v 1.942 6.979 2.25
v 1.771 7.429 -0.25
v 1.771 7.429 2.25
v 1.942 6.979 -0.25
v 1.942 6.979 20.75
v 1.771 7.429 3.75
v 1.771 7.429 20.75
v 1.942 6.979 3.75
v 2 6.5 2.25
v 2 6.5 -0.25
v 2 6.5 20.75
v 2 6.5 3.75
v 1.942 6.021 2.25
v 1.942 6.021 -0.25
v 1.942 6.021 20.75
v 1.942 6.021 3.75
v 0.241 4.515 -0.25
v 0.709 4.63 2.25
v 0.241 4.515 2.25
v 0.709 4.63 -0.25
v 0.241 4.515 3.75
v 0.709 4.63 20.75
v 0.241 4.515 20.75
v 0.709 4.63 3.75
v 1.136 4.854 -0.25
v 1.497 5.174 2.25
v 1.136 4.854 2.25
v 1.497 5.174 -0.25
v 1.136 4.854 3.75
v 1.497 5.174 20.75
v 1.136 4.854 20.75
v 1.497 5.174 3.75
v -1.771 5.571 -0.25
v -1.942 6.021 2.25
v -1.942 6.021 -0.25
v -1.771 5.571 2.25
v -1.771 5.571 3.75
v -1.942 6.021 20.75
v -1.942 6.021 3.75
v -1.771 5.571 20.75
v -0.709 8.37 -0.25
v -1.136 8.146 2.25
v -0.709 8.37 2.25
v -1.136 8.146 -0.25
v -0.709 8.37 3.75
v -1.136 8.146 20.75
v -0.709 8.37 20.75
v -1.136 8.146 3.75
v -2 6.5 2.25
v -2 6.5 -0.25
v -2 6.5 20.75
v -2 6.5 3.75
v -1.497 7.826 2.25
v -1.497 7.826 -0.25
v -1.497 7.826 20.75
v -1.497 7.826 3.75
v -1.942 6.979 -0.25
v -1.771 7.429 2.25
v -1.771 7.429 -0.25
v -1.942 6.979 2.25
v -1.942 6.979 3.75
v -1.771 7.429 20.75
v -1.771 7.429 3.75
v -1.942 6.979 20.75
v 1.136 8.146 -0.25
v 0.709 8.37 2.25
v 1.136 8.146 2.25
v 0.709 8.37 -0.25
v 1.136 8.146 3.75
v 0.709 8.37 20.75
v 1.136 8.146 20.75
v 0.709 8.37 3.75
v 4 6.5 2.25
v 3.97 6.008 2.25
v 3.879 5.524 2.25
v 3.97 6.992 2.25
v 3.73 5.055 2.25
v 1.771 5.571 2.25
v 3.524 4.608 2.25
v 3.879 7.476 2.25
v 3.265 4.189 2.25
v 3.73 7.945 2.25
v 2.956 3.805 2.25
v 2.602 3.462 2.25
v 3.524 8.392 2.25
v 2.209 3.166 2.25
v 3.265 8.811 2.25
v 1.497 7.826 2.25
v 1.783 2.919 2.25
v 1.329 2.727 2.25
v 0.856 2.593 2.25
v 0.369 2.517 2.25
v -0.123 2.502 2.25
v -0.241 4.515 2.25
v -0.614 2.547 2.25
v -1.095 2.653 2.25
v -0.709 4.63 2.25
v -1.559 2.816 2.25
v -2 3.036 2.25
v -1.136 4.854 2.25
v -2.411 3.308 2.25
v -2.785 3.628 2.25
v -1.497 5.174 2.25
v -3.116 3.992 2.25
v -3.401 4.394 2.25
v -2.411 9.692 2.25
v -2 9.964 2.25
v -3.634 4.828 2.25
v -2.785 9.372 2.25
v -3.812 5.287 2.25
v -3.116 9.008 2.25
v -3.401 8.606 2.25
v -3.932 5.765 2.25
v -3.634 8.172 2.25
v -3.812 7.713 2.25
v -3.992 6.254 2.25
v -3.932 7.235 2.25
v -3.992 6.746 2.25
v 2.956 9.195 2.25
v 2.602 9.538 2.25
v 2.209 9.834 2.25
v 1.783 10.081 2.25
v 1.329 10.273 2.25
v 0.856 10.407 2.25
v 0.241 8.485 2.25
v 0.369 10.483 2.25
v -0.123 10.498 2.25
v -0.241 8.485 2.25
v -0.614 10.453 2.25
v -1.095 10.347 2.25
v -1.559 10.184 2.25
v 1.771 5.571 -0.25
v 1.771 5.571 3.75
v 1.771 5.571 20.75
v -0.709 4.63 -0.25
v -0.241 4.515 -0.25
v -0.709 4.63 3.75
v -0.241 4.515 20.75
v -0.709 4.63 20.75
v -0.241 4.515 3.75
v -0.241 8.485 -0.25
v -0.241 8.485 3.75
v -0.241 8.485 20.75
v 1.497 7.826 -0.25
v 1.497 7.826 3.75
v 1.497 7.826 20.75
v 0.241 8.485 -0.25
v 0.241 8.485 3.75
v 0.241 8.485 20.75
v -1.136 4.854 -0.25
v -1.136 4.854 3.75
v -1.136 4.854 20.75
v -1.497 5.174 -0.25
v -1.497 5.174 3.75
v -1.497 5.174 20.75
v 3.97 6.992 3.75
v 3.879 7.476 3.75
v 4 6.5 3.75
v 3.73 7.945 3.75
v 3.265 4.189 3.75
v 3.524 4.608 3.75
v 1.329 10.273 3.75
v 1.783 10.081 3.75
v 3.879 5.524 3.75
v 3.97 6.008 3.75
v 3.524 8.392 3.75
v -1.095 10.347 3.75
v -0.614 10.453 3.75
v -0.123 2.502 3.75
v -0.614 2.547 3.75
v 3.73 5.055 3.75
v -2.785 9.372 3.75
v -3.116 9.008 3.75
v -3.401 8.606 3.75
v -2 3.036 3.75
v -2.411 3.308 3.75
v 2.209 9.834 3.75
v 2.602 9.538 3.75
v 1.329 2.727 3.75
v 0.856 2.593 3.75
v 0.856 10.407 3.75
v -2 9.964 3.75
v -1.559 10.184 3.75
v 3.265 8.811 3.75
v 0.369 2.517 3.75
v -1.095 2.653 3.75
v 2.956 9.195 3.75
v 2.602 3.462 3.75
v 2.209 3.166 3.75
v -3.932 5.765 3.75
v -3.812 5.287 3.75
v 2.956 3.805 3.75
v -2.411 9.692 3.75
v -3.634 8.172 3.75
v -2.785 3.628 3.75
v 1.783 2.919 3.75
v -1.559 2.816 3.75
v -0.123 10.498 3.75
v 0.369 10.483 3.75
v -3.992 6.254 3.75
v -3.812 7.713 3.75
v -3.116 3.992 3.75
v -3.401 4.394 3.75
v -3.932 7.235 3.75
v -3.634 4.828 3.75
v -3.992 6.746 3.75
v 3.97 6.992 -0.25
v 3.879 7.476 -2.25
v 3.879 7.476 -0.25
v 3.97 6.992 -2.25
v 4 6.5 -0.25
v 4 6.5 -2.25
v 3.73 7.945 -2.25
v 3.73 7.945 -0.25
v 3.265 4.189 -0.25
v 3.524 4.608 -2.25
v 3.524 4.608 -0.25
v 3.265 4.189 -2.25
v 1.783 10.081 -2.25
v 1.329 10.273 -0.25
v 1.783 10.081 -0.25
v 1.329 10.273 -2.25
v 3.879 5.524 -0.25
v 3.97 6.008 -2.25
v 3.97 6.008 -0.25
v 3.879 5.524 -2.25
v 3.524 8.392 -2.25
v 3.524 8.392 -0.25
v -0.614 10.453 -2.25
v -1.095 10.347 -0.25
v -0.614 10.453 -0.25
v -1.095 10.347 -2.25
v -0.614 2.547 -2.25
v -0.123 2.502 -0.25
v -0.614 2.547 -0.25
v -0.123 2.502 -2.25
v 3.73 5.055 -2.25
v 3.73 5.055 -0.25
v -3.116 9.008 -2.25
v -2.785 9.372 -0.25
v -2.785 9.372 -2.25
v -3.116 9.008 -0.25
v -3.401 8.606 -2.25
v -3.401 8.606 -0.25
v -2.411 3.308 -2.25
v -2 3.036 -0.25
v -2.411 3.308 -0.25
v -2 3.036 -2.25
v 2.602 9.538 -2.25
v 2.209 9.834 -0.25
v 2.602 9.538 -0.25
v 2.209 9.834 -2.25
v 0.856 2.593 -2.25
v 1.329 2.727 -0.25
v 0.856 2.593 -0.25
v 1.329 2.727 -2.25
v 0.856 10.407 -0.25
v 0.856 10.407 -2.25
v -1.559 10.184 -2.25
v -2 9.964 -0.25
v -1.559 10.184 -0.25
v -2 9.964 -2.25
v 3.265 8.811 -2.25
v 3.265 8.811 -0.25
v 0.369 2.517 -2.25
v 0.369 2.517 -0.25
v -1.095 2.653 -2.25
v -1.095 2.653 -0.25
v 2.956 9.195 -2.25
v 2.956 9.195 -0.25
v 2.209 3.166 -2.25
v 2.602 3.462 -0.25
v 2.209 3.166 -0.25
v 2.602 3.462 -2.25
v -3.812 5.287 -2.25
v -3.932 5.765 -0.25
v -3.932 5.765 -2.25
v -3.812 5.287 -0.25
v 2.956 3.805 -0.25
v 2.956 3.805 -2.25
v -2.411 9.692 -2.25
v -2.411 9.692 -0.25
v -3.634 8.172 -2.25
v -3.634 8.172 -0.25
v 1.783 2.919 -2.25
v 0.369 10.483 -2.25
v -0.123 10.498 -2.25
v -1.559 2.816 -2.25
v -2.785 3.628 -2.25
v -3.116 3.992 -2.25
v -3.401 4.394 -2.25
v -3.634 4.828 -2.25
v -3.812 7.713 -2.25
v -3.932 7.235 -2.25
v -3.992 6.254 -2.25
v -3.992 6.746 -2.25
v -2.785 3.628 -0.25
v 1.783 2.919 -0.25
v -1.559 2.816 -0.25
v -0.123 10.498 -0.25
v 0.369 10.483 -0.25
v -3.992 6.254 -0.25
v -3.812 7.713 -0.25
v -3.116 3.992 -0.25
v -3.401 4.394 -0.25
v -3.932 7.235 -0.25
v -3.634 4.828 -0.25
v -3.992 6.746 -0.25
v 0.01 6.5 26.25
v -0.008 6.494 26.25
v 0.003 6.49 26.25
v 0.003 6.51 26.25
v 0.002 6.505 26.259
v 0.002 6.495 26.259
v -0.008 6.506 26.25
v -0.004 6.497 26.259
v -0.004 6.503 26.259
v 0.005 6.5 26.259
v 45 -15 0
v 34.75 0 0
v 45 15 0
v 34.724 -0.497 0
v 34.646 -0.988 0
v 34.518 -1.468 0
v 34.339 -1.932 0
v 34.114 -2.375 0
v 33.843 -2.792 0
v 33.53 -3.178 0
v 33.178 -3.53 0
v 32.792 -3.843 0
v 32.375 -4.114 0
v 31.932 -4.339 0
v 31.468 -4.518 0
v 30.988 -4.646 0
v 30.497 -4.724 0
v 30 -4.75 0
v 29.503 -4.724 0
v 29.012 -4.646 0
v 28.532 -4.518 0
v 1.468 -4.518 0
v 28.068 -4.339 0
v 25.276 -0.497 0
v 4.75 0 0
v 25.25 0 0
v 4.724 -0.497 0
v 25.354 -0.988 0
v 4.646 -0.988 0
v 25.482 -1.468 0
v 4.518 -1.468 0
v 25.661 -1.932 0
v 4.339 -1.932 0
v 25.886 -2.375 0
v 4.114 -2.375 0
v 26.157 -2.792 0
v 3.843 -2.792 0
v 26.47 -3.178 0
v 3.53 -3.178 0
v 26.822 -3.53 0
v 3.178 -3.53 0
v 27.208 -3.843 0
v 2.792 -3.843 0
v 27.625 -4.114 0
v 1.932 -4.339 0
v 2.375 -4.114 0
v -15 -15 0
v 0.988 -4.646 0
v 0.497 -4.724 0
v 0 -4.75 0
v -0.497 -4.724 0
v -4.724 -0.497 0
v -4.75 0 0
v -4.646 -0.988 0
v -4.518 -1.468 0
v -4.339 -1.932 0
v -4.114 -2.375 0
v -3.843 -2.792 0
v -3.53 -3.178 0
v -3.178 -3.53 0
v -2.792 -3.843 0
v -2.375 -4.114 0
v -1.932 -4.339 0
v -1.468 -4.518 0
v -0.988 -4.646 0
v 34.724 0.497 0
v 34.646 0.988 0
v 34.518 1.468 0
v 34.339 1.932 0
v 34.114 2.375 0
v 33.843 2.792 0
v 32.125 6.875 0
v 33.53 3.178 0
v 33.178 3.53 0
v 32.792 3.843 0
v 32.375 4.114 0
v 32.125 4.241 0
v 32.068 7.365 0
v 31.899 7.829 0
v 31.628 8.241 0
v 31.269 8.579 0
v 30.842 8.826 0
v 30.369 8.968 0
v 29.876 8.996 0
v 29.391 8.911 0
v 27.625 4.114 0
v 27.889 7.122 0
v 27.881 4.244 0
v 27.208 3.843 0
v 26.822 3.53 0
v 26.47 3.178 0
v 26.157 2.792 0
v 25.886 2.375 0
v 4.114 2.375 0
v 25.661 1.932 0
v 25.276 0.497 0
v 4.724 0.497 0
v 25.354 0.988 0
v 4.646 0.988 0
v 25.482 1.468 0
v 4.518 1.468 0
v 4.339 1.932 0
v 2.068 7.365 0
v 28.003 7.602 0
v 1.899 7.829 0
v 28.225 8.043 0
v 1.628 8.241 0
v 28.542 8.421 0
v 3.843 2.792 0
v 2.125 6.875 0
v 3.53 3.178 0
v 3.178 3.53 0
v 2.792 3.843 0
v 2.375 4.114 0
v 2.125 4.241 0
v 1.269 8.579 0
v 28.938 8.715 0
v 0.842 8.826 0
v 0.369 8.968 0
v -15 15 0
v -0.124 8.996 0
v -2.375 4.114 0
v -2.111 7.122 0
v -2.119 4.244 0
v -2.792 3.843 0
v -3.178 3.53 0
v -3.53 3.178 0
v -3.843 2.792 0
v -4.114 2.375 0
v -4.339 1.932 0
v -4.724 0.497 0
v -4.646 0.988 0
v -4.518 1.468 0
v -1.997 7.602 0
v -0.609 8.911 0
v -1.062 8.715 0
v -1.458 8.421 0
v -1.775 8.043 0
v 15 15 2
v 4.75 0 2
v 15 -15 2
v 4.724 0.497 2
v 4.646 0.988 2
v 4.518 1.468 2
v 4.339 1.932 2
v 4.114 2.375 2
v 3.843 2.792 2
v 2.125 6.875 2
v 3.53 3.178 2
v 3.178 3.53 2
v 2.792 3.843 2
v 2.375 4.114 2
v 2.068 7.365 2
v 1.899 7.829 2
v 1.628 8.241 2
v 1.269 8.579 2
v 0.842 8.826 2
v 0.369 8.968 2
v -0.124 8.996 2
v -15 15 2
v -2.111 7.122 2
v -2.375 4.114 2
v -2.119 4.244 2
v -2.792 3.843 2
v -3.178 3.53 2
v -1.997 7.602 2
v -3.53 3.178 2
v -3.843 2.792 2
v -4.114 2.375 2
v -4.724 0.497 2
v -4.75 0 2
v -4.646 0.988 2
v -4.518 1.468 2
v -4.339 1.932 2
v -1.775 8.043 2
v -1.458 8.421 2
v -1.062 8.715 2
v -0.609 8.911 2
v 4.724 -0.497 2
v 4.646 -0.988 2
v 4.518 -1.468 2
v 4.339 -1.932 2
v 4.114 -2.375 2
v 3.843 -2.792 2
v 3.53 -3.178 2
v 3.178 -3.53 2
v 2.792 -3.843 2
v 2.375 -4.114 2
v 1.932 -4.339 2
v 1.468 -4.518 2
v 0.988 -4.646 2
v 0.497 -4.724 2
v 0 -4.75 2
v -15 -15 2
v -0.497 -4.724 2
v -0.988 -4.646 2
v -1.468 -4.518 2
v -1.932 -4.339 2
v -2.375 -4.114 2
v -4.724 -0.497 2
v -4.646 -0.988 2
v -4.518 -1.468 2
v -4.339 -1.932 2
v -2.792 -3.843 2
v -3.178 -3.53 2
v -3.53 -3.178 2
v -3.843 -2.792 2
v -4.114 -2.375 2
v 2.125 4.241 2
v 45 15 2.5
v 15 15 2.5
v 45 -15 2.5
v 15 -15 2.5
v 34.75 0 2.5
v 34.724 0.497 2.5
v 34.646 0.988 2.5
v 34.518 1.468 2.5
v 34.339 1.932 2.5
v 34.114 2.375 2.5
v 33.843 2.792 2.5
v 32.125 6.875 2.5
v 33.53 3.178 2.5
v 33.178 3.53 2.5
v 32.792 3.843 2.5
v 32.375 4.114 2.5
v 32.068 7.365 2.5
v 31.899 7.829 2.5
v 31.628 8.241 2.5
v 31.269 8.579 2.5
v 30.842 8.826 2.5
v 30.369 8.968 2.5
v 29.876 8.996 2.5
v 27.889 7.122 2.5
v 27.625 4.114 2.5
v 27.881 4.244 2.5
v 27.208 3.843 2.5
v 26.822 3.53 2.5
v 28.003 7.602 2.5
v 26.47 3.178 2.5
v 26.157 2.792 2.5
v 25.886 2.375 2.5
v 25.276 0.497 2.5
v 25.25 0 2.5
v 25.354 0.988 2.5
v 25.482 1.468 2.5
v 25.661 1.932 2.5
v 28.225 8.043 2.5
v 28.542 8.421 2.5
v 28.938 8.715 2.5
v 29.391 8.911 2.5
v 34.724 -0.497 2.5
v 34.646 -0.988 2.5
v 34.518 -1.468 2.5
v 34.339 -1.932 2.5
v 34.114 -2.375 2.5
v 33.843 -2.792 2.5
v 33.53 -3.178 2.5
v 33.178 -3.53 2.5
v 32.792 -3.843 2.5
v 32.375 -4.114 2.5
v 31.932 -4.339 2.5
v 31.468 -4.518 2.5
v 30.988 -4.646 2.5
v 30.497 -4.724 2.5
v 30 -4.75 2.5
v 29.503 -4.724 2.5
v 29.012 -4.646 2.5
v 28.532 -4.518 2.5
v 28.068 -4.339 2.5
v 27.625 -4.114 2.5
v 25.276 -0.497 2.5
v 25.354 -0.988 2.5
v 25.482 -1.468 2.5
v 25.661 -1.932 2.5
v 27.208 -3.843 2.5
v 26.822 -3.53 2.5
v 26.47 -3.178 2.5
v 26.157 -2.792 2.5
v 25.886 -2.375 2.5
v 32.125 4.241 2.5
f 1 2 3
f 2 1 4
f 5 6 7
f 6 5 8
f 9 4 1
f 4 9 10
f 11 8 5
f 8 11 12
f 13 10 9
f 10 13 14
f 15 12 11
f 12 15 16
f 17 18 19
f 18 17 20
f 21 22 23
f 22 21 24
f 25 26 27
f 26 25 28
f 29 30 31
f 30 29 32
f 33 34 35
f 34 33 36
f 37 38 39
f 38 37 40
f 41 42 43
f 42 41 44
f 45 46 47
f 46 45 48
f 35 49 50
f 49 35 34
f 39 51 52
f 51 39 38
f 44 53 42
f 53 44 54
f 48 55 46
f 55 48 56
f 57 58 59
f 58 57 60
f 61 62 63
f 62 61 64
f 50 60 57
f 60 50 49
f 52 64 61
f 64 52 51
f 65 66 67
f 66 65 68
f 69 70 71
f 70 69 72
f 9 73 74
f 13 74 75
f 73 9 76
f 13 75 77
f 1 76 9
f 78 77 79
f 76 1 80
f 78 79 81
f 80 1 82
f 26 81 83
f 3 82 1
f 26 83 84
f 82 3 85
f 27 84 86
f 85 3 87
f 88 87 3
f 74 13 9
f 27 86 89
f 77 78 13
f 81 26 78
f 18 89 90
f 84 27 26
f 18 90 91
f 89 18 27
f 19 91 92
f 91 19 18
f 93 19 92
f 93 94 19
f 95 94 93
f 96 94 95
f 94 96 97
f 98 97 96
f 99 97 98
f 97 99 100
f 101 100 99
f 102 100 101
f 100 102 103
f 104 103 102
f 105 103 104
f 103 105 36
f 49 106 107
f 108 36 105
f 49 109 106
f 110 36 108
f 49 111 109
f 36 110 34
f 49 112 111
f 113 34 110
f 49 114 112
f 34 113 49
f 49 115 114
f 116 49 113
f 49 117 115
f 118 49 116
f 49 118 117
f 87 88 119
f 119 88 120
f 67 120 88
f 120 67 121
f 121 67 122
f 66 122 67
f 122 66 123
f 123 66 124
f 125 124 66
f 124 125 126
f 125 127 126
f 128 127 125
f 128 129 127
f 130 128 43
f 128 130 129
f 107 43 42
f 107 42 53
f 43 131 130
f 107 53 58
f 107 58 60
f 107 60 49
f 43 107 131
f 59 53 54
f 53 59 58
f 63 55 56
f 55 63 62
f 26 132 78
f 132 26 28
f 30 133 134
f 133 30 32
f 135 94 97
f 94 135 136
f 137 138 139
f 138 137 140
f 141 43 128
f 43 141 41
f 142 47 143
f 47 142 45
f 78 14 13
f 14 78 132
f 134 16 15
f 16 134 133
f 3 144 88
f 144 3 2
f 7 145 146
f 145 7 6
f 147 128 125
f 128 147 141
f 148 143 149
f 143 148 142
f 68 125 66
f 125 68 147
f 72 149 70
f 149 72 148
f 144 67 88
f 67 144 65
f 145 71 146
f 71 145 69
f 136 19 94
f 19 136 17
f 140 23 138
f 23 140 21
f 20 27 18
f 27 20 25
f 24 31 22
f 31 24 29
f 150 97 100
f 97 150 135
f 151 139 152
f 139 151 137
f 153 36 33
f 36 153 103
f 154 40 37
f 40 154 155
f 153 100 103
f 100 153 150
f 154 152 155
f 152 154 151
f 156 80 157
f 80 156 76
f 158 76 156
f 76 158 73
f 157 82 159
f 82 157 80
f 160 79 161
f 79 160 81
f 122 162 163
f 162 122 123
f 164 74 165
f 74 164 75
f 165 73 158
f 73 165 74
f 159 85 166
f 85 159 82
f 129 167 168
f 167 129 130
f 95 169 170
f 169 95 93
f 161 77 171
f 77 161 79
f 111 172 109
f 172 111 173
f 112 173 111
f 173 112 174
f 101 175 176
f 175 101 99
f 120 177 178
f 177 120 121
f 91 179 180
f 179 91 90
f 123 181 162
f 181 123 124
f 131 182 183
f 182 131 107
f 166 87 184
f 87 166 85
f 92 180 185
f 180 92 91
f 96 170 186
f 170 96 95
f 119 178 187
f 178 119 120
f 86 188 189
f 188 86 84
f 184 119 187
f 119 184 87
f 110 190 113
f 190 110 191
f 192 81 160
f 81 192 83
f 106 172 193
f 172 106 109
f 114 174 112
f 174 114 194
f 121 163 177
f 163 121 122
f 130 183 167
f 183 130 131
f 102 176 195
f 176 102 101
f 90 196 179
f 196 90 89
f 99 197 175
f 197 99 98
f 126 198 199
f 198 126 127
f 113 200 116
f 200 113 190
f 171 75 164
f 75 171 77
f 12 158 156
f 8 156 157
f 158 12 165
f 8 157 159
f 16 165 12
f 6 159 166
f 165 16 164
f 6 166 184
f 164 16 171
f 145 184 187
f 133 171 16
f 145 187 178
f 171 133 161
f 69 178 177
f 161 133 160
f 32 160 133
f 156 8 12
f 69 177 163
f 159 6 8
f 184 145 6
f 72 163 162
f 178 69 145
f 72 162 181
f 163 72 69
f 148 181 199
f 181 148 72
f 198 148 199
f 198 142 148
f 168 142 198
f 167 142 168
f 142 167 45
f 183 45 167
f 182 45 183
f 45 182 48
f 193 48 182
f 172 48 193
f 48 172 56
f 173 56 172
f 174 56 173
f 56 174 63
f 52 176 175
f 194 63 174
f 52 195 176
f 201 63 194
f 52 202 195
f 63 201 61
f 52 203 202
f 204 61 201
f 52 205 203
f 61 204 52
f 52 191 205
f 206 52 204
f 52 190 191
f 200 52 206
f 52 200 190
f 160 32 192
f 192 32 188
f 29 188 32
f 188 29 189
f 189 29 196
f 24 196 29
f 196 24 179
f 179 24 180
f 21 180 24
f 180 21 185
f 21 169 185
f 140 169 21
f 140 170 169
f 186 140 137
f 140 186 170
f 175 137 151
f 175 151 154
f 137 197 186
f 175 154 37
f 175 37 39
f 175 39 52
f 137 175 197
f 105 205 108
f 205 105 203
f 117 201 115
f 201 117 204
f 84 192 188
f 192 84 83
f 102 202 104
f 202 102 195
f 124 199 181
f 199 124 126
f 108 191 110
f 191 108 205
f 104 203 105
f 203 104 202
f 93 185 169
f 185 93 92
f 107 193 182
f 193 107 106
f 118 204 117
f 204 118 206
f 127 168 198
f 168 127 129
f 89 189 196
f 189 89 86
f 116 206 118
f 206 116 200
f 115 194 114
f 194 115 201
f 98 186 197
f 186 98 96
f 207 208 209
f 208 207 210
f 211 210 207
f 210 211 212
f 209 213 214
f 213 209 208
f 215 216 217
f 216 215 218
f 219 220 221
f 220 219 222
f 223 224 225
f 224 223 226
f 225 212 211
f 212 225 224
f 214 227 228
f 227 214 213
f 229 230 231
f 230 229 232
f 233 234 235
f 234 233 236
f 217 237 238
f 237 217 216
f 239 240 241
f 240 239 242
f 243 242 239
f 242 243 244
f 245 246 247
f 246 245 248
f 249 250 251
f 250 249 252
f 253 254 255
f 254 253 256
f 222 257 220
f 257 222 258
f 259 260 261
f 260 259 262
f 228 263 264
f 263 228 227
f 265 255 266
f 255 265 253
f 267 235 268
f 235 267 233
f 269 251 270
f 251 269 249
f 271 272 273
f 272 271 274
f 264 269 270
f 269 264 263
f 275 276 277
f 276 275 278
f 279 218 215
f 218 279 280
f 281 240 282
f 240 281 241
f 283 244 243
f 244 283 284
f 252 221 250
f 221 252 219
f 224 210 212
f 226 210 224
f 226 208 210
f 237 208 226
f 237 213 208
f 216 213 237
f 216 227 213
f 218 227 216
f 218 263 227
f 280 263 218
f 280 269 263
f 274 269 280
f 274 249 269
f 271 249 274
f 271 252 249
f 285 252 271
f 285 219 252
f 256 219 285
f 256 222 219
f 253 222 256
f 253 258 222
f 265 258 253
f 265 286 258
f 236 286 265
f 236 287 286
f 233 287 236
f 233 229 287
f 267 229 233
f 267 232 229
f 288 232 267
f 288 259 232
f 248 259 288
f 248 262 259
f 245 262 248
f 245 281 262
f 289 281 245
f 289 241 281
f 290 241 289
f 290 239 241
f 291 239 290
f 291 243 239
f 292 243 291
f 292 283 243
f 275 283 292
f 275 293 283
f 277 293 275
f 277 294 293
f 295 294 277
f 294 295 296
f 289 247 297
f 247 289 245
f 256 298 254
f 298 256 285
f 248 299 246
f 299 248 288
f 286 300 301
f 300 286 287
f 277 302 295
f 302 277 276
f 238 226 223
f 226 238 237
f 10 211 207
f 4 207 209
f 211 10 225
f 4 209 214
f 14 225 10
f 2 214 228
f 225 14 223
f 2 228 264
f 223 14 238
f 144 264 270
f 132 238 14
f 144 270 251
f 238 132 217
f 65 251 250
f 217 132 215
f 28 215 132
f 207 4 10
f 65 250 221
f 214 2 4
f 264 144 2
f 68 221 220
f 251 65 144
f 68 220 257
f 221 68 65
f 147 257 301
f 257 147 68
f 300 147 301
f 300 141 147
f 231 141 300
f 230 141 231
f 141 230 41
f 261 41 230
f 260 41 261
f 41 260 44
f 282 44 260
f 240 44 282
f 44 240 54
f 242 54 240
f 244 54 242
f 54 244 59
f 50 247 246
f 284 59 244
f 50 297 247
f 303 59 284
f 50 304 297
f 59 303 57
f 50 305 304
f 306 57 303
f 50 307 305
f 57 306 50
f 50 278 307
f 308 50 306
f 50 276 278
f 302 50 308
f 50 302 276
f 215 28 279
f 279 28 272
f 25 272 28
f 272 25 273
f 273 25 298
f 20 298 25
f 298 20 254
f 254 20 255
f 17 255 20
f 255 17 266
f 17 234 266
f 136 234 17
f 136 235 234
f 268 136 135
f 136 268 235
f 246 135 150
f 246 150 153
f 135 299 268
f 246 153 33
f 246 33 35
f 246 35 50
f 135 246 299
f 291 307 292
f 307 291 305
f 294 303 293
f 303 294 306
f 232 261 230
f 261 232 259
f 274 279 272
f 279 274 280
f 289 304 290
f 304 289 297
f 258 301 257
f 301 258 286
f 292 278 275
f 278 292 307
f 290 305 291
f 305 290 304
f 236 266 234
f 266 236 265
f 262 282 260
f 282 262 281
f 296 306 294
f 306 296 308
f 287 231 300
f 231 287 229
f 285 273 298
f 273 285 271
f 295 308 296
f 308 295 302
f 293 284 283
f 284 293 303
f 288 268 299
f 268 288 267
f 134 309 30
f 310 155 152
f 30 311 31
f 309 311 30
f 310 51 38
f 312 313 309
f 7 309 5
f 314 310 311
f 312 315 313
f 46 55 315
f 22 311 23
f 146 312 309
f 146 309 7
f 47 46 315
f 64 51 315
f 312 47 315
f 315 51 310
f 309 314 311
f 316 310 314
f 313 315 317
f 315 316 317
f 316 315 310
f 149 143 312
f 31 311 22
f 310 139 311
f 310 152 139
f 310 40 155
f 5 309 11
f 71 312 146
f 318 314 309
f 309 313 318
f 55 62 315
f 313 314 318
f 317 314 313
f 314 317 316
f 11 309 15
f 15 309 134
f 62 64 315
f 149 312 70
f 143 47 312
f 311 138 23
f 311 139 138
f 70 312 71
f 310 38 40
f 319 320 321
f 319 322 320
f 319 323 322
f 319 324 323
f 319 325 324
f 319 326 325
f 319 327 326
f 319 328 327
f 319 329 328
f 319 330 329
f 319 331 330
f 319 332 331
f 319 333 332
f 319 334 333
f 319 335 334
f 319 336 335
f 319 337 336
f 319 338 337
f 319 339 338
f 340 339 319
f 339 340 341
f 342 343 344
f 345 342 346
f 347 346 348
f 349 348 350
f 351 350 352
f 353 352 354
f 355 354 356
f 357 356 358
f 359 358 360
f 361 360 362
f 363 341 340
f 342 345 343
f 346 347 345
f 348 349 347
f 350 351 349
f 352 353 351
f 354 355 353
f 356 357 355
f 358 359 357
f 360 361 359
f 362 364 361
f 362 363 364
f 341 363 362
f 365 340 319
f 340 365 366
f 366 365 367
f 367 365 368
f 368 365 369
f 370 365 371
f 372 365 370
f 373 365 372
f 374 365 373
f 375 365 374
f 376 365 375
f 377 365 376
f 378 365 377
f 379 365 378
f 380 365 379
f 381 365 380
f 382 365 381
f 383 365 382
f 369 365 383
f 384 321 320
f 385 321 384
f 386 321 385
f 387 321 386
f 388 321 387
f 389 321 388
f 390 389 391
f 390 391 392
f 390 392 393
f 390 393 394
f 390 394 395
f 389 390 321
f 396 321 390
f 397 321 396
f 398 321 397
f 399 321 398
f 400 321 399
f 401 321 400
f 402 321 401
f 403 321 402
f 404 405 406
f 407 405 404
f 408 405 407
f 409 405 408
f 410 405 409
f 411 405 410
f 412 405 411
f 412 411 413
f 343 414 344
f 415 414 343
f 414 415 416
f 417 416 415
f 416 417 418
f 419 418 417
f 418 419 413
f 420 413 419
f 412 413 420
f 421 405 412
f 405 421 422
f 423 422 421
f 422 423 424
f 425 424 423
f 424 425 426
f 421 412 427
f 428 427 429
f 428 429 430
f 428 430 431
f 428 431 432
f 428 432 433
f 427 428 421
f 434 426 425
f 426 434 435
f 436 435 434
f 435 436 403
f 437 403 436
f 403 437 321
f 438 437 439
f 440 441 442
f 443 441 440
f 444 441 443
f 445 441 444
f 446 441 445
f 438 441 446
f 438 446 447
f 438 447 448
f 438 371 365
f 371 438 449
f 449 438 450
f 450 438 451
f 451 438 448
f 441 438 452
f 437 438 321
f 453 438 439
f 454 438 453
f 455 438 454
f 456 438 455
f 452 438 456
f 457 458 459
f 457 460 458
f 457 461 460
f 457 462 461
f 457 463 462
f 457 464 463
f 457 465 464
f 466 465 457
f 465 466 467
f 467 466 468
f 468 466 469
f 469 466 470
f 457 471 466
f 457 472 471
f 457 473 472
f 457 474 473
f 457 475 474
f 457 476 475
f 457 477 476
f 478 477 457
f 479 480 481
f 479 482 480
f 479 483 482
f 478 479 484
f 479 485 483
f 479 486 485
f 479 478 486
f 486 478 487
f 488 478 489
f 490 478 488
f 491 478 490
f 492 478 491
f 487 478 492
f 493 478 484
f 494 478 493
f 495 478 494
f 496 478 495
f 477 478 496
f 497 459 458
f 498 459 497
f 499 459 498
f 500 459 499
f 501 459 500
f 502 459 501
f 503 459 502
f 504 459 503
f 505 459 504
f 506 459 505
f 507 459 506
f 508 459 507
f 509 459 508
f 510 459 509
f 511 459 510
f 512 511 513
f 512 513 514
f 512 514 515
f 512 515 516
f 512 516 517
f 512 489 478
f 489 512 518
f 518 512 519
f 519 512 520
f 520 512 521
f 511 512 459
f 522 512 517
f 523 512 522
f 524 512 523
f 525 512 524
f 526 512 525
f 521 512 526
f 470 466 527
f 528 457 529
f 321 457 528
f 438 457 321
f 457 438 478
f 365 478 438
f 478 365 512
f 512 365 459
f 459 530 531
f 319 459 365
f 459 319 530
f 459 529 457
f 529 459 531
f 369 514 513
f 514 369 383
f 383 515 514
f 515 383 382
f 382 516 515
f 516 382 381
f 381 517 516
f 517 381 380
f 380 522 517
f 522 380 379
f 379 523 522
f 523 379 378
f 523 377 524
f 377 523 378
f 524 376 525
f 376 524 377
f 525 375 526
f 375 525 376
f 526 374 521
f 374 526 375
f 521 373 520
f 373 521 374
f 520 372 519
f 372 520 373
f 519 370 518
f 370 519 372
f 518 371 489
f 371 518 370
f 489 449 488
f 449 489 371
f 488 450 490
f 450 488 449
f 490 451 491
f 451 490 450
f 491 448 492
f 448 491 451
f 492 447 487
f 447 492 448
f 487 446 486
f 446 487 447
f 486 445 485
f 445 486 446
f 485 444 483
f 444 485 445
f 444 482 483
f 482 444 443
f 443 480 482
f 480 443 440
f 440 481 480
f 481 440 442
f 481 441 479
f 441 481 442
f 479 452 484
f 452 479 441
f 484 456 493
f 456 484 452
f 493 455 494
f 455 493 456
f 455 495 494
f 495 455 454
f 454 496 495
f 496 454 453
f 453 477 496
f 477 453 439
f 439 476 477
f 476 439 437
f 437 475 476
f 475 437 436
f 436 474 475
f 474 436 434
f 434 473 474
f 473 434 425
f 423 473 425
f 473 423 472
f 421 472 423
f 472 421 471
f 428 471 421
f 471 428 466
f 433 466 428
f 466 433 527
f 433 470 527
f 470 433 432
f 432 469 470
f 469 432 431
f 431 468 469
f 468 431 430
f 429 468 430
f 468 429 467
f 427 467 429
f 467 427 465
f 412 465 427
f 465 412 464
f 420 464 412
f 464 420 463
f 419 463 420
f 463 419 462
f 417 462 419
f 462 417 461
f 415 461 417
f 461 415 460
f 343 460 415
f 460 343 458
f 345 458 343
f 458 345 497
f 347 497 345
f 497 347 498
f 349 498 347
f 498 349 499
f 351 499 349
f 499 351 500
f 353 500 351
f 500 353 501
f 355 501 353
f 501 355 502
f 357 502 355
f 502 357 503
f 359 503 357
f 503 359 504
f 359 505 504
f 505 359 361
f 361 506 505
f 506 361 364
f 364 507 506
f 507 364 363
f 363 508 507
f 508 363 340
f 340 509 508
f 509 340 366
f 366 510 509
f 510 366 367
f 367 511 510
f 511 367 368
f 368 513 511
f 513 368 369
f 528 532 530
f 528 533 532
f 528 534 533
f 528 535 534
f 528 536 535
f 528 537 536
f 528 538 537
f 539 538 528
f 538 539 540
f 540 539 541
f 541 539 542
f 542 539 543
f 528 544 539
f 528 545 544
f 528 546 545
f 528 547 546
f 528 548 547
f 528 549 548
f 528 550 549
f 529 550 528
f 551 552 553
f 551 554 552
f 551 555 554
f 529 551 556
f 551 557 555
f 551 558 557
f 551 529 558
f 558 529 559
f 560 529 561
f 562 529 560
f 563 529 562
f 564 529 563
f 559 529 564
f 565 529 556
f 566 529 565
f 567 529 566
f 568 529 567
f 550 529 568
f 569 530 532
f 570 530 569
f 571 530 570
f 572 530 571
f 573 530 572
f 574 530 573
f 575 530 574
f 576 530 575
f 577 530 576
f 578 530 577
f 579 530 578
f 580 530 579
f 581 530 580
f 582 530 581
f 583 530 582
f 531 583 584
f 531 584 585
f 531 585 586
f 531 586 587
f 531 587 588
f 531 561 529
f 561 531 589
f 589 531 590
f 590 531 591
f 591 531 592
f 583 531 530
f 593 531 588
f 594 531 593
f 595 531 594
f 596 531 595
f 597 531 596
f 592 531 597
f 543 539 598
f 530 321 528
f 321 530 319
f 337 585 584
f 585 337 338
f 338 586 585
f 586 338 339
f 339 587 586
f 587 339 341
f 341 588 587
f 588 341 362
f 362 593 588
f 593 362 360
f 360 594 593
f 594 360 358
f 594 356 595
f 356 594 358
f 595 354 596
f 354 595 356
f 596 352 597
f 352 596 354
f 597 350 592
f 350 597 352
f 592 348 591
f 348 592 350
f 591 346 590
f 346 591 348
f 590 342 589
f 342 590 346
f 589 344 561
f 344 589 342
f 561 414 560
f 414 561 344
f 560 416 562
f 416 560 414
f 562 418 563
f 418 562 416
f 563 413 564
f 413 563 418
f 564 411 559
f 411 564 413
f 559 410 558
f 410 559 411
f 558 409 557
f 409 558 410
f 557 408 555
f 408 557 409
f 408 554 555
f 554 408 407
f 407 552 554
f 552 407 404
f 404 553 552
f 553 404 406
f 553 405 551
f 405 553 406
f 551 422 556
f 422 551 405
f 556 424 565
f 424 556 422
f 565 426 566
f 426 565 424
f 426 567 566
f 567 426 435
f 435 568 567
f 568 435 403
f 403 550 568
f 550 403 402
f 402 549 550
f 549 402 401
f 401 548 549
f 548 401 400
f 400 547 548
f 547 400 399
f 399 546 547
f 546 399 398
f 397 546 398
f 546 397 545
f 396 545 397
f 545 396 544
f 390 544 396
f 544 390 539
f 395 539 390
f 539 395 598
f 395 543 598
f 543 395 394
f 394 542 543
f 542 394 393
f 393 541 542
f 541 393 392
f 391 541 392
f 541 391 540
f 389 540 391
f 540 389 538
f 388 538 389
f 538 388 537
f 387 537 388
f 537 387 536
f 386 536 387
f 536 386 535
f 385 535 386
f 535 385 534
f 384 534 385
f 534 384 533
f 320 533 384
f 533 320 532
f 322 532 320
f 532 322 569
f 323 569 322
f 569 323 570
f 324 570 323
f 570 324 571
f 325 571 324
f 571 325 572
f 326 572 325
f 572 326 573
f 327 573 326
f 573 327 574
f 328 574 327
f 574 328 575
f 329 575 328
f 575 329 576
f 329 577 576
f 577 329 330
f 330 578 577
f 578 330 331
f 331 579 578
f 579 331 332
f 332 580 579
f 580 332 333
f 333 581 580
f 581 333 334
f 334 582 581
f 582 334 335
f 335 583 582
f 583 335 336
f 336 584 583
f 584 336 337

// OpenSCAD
$fa = 1;
$fs = 0.5;


color("silver", 0.5)
translate([0, 6.5, -2.25])
mounting_screw();

linear_extrude(2)
difference() {
  square(30, center=true);
  mounting_screw_hole();
}
translate([30, 0, 0])
linear_extrude(2.5)
difference() {
  square(30, center=true);
  mounting_screw_hole();
}

module mounting_screw() {
  cylinder(h=2, d=8);

  translate([0, 0, 2]) {
    cylinder(h=2.5, d=4);

    translate([0, 0, 2.5]) {
      cylinder(h=1.5, d=8);
    }
  }

  hull() {
    cylinder(h=23, d=4);

    translate([0, 0, 28.5])
    sphere(0.01);
  }
}

module mounting_screw_hole() {
  circle(d=9.5);

  hull() {
    square(center=true, 4.25);
    translate([0, (9.5 + 4.25) / 2, 0])
    circle(d=4.25);
  }
}
